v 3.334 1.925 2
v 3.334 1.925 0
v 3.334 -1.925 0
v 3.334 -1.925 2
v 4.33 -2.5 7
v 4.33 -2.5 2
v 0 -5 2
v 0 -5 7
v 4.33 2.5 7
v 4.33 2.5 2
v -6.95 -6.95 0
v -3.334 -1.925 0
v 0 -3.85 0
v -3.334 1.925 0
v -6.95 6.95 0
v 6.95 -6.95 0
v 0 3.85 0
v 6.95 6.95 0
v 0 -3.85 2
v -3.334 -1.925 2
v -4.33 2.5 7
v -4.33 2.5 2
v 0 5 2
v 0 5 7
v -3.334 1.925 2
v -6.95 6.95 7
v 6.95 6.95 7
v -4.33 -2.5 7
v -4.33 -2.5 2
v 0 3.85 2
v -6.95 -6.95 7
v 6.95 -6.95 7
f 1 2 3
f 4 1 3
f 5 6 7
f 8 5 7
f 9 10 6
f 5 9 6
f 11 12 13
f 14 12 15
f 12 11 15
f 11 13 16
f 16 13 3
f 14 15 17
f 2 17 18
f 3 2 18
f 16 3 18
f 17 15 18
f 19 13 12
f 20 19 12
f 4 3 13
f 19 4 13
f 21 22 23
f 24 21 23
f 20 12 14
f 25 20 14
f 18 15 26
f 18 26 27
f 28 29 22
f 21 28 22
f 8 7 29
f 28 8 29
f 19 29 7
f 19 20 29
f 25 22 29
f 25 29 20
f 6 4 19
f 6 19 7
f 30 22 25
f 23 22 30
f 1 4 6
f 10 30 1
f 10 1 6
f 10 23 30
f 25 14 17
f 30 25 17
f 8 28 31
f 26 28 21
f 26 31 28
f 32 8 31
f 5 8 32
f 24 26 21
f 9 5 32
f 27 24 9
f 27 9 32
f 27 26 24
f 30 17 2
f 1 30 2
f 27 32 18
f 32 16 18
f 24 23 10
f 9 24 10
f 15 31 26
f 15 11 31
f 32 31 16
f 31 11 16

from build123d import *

# Parameters (mm, degrees)
F0_W     = 13.9
F0_H     = 13.9
F1_DEPTH = 2
F2_W     = 13.9
F2_H     = 13.9
F3_DEPTH = 5


with BuildPart() as f1:
    # F0 (on Top) → F1 (new body)
    with BuildSketch(Plane.XY):
        Rectangle(F0_W, F0_H)
        with BuildLine():
            ThreePointArc((3.334198, 1.925), (3.718814, 0.996453), (3.85, 0))
            ThreePointArc((3.85, 0), (3.718814, -0.996453), (3.334198, -1.925))
            ThreePointArc((3.334198, -1.925), (1.925, -3.334198), (0, -3.85))
            ThreePointArc((0, -3.85), (-1.925, -3.334198), (-3.334198, -1.925))
            ThreePointArc((-3.334198, -1.925), (-3.85, 0), (-3.334198, 1.925))
            ThreePointArc((-3.334198, 1.925), (-1.925, 3.334198), (0, 3.85))
            ThreePointArc((0, 3.85), (1.925, 3.334198), (3.334198, 1.925))
        make_face(mode=Mode.SUBTRACT)
        with BuildLine():
            ThreePointArc((-3.334198, -1.925), (-1.925, -3.334198), (0, -3.85))
            Line((0, -3.85), (-3.334198, -1.925))
        make_face()
        with BuildLine():
            Line((-3.334198, -1.925), (-3.334198, 1.925))
            ThreePointArc((-3.334198, 1.925), (-3.85, 0), (-3.334198, -1.925))
        make_face()
        with BuildLine():
            Line((-3.334198, 1.925), (0, 3.85))
            ThreePointArc((0, 3.85), (-1.925, 3.334198), (-3.334198, 1.925))
        make_face()
        with BuildLine():
            Line((0, 3.85), (3.334198, 1.925))
            ThreePointArc((3.334198, 1.925), (1.925, 3.334198), (0, 3.85))
        make_face()
        with BuildLine():
            ThreePointArc((3.334198, -1.925), (3.718814, -0.996453), (3.85, 0))
            ThreePointArc((3.85, 0), (3.718814, 0.996453), (3.334198, 1.925))
            Line((3.334198, 1.925), (3.334198, -1.925))
        make_face()
        with BuildLine():
            ThreePointArc((0, -3.85), (1.925, -3.334198), (3.334198, -1.925))
            Line((3.334198, -1.925), (0, -3.85))
        make_face()
    extrude(amount=F1_DEPTH)

    # F2 (on face) → F3 (join)
    with BuildSketch(Plane.XY.offset(2)):
        Rectangle(F2_W, F2_H)
        with BuildLine():
            ThreePointArc((4.330127, 2.5), (4.829629, 1.294095), (5, 0))
            ThreePointArc((5, 0), (4.829629, -1.294095), (4.330127, -2.5))
            ThreePointArc((4.330127, -2.5), (2.5, -4.330127), (0, -5))
            ThreePointArc((0, -5), (-2.5, -4.330127), (-4.330127, -2.5))
            ThreePointArc((-4.330127, -2.5), (-5, 0), (-4.330127, 2.5))
            ThreePointArc((-4.330127, 2.5), (-2.5, 4.330127), (0, 5))
            ThreePointArc((0, 5), (2.5, 4.330127), (4.330127, 2.5))
        make_face(mode=Mode.SUBTRACT)
        with BuildLine():
            Line((-4.330127, -2.5), (-4.330127, 2.5))
            ThreePointArc((-4.330127, 2.5), (-5, 0), (-4.330127, -2.5))
        make_face()
        with BuildLine():
            Line((-4.330127, 2.5), (0, 5))
            ThreePointArc((0, 5), (-2.5, 4.330127), (-4.330127, 2.5))
        make_face()
        with BuildLine():
            Line((0, 5), (4.330127, 2.5))
            ThreePointArc((4.330127, 2.5), (2.5, 4.330127), (0, 5))
        make_face()
        with BuildLine():
            ThreePointArc((4.330127, -2.5), (4.829629, -1.294095), (5, 0))
            ThreePointArc((5, 0), (4.829629, 1.294095), (4.330127, 2.5))
            Line((4.330127, 2.5), (4.330127, -2.5))
        make_face()
        with BuildLine():
            ThreePointArc((0, -5), (2.5, -4.330127), (4.330127, -2.5))
            Line((4.330127, -2.5), (0, -5))
        make_face()
        with BuildLine():
            ThreePointArc((-4.330127, -2.5), (-2.5, -4.330127), (0, -5))
            Line((0, -5), (-4.330127, -2.5))
        make_face()
    extrude(amount=F3_DEPTH)


solid = f1.part
